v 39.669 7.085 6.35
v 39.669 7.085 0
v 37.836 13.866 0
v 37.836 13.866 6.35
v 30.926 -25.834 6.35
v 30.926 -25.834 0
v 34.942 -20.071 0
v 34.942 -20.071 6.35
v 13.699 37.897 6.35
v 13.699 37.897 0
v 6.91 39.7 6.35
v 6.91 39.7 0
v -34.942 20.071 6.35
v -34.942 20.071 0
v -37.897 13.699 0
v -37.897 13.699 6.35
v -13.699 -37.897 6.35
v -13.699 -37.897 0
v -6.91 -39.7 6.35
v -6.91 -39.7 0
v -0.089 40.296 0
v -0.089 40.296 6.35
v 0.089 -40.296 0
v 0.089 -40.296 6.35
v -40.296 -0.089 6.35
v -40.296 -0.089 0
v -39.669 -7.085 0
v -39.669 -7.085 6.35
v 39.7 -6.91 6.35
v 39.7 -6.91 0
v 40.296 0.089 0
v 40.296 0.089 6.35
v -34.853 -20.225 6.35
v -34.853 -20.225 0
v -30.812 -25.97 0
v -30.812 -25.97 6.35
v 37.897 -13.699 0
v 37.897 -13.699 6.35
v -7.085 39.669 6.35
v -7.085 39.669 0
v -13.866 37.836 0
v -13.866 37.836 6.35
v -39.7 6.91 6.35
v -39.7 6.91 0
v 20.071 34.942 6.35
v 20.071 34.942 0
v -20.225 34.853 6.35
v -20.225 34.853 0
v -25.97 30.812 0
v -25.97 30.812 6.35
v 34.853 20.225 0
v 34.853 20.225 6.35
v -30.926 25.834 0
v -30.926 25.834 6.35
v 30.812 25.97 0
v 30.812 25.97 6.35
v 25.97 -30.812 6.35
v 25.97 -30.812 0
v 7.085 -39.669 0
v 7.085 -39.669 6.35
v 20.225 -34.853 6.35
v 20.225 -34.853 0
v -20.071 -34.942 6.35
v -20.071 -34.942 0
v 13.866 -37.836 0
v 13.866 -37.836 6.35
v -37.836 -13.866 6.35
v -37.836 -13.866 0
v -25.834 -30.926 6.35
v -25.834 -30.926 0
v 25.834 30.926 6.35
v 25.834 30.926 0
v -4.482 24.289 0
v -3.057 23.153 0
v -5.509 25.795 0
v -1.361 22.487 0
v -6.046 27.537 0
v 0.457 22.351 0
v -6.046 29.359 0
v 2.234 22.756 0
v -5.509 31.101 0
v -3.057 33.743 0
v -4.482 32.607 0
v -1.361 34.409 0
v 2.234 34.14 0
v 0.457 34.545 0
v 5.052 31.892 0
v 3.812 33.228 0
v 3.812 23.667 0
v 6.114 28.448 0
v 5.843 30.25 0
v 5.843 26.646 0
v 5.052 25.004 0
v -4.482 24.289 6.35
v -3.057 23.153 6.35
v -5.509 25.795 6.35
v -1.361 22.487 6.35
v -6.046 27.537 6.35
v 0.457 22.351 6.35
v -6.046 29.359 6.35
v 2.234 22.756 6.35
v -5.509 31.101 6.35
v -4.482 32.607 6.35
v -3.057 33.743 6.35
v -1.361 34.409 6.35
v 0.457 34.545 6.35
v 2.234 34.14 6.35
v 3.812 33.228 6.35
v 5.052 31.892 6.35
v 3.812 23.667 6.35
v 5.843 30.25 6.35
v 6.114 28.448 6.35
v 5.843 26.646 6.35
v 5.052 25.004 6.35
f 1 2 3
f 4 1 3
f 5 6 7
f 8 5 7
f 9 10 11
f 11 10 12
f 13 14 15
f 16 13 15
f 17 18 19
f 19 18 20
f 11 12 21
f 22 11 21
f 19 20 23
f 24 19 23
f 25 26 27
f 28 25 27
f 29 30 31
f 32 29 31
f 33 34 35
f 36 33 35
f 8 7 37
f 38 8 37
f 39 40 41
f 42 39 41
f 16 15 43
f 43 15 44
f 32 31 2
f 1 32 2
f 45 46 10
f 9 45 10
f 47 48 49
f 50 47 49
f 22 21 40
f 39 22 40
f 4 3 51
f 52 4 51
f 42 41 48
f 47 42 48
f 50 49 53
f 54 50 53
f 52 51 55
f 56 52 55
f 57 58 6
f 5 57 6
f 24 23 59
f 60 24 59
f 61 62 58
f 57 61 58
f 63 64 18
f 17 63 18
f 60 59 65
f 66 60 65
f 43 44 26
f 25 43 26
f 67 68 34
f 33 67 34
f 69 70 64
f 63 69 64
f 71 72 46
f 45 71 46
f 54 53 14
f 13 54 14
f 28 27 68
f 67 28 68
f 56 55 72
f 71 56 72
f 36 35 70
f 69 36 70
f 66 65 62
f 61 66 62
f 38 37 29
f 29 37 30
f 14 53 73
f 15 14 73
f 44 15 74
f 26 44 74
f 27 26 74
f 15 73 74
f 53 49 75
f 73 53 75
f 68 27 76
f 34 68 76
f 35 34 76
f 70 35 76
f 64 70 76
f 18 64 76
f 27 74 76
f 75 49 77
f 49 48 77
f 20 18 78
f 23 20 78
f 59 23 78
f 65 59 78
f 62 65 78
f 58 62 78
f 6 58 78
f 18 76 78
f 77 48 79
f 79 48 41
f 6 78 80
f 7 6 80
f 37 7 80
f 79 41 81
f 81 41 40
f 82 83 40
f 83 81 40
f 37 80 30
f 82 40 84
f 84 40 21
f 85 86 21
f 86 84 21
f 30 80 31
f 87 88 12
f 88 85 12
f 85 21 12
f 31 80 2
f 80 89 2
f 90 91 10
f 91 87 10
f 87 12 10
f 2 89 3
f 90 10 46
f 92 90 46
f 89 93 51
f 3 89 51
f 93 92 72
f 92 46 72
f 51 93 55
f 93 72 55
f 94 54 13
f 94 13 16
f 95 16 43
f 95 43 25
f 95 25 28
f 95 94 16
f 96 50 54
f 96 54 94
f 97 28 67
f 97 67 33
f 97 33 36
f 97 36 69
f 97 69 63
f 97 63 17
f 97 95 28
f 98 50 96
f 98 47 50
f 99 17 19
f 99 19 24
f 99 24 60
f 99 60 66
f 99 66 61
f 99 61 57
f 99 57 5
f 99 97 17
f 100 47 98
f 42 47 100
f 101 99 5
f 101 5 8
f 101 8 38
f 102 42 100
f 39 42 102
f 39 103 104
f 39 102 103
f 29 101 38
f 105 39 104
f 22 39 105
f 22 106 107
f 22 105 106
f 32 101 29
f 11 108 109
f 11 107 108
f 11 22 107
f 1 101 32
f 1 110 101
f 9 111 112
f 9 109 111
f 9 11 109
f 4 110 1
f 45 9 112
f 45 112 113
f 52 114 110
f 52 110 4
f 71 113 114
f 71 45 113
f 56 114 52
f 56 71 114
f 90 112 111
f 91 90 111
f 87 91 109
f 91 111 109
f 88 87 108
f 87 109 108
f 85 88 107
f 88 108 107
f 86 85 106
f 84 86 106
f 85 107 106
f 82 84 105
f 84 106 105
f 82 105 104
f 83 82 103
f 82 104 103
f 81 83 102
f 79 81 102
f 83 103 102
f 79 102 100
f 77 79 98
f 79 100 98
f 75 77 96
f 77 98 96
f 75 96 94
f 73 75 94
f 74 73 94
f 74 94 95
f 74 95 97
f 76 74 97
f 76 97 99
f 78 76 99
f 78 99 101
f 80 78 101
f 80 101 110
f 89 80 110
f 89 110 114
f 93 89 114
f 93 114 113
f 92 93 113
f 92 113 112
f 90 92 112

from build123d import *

# Parameters (mm, degrees)
F1_DEPTH = 6.35
F4_R     = 6.1144864015
F5_DEPTH = 6.351


# Not quite as in the source:
# - the program builds the solid bodies; features that only make, move or delete a surface that nothing else refers to are left out


with BuildPart() as f1:
    # F0 (on Top) → F1 (new body)
    with BuildSketch(Plane.XY):
        Polygon((37.8358727575, 13.8656235676), (34.8533205688, 20.2251039445), (30.8117678713, 25.9700547725), (25.8340151985, 30.9259186276), (20.0713090466, 34.9421140946), (13.6987463258, 37.8966111063), (6.9099541298, 39.6996387661), (-0.0887935258, 40.2964129911), (-7.084843235, 39.6688010983), (-13.8656235676, 37.8358727575), (-20.2251039445, 34.8533205688), (-25.9700547725, 30.8117678713), (-30.9259186276, 25.8340151985), (-34.9421140946, 20.0713090466), (-37.8966111063, 13.6987463258), (-39.6996387661, 6.9099541298), (-40.2964129911, -0.0887935258), (-39.6688010983, -7.084843235), (-37.8358727575, -13.8656235676), (-34.8533205688, -20.2251039445), (-30.8117678713, -25.9700547725), (-25.8340151985, -30.9259186276), (-20.0713090466, -34.9421140946), (-13.6987463258, -37.8966111063), (-6.9099541298, -39.6996387661), (0.0887935258, -40.2964129911), (7.084843235, -39.6688010983), (13.8656235676, -37.8358727575), (20.2251039445, -34.8533205688), (25.9700547725, -30.8117678713), (30.9259186276, -25.8340151985), (34.9421140946, -20.0713090466), (37.8966111063, -13.6987463258), (39.6996387661, -6.9099541298), (40.2964129911, 0.0887935258), (39.6688010983, 7.084843235), align=None)
    extrude(amount=F1_DEPTH)

    # F4 (on face) → F5 (cut, through all)
    with BuildSketch(Plane.XY.offset(6.35)):
        with Locations((0, 28.4479867001)):
            Circle(F4_R)
    extrude(amount=-F5_DEPTH, mode=Mode.SUBTRACT)


solid = f1.part
